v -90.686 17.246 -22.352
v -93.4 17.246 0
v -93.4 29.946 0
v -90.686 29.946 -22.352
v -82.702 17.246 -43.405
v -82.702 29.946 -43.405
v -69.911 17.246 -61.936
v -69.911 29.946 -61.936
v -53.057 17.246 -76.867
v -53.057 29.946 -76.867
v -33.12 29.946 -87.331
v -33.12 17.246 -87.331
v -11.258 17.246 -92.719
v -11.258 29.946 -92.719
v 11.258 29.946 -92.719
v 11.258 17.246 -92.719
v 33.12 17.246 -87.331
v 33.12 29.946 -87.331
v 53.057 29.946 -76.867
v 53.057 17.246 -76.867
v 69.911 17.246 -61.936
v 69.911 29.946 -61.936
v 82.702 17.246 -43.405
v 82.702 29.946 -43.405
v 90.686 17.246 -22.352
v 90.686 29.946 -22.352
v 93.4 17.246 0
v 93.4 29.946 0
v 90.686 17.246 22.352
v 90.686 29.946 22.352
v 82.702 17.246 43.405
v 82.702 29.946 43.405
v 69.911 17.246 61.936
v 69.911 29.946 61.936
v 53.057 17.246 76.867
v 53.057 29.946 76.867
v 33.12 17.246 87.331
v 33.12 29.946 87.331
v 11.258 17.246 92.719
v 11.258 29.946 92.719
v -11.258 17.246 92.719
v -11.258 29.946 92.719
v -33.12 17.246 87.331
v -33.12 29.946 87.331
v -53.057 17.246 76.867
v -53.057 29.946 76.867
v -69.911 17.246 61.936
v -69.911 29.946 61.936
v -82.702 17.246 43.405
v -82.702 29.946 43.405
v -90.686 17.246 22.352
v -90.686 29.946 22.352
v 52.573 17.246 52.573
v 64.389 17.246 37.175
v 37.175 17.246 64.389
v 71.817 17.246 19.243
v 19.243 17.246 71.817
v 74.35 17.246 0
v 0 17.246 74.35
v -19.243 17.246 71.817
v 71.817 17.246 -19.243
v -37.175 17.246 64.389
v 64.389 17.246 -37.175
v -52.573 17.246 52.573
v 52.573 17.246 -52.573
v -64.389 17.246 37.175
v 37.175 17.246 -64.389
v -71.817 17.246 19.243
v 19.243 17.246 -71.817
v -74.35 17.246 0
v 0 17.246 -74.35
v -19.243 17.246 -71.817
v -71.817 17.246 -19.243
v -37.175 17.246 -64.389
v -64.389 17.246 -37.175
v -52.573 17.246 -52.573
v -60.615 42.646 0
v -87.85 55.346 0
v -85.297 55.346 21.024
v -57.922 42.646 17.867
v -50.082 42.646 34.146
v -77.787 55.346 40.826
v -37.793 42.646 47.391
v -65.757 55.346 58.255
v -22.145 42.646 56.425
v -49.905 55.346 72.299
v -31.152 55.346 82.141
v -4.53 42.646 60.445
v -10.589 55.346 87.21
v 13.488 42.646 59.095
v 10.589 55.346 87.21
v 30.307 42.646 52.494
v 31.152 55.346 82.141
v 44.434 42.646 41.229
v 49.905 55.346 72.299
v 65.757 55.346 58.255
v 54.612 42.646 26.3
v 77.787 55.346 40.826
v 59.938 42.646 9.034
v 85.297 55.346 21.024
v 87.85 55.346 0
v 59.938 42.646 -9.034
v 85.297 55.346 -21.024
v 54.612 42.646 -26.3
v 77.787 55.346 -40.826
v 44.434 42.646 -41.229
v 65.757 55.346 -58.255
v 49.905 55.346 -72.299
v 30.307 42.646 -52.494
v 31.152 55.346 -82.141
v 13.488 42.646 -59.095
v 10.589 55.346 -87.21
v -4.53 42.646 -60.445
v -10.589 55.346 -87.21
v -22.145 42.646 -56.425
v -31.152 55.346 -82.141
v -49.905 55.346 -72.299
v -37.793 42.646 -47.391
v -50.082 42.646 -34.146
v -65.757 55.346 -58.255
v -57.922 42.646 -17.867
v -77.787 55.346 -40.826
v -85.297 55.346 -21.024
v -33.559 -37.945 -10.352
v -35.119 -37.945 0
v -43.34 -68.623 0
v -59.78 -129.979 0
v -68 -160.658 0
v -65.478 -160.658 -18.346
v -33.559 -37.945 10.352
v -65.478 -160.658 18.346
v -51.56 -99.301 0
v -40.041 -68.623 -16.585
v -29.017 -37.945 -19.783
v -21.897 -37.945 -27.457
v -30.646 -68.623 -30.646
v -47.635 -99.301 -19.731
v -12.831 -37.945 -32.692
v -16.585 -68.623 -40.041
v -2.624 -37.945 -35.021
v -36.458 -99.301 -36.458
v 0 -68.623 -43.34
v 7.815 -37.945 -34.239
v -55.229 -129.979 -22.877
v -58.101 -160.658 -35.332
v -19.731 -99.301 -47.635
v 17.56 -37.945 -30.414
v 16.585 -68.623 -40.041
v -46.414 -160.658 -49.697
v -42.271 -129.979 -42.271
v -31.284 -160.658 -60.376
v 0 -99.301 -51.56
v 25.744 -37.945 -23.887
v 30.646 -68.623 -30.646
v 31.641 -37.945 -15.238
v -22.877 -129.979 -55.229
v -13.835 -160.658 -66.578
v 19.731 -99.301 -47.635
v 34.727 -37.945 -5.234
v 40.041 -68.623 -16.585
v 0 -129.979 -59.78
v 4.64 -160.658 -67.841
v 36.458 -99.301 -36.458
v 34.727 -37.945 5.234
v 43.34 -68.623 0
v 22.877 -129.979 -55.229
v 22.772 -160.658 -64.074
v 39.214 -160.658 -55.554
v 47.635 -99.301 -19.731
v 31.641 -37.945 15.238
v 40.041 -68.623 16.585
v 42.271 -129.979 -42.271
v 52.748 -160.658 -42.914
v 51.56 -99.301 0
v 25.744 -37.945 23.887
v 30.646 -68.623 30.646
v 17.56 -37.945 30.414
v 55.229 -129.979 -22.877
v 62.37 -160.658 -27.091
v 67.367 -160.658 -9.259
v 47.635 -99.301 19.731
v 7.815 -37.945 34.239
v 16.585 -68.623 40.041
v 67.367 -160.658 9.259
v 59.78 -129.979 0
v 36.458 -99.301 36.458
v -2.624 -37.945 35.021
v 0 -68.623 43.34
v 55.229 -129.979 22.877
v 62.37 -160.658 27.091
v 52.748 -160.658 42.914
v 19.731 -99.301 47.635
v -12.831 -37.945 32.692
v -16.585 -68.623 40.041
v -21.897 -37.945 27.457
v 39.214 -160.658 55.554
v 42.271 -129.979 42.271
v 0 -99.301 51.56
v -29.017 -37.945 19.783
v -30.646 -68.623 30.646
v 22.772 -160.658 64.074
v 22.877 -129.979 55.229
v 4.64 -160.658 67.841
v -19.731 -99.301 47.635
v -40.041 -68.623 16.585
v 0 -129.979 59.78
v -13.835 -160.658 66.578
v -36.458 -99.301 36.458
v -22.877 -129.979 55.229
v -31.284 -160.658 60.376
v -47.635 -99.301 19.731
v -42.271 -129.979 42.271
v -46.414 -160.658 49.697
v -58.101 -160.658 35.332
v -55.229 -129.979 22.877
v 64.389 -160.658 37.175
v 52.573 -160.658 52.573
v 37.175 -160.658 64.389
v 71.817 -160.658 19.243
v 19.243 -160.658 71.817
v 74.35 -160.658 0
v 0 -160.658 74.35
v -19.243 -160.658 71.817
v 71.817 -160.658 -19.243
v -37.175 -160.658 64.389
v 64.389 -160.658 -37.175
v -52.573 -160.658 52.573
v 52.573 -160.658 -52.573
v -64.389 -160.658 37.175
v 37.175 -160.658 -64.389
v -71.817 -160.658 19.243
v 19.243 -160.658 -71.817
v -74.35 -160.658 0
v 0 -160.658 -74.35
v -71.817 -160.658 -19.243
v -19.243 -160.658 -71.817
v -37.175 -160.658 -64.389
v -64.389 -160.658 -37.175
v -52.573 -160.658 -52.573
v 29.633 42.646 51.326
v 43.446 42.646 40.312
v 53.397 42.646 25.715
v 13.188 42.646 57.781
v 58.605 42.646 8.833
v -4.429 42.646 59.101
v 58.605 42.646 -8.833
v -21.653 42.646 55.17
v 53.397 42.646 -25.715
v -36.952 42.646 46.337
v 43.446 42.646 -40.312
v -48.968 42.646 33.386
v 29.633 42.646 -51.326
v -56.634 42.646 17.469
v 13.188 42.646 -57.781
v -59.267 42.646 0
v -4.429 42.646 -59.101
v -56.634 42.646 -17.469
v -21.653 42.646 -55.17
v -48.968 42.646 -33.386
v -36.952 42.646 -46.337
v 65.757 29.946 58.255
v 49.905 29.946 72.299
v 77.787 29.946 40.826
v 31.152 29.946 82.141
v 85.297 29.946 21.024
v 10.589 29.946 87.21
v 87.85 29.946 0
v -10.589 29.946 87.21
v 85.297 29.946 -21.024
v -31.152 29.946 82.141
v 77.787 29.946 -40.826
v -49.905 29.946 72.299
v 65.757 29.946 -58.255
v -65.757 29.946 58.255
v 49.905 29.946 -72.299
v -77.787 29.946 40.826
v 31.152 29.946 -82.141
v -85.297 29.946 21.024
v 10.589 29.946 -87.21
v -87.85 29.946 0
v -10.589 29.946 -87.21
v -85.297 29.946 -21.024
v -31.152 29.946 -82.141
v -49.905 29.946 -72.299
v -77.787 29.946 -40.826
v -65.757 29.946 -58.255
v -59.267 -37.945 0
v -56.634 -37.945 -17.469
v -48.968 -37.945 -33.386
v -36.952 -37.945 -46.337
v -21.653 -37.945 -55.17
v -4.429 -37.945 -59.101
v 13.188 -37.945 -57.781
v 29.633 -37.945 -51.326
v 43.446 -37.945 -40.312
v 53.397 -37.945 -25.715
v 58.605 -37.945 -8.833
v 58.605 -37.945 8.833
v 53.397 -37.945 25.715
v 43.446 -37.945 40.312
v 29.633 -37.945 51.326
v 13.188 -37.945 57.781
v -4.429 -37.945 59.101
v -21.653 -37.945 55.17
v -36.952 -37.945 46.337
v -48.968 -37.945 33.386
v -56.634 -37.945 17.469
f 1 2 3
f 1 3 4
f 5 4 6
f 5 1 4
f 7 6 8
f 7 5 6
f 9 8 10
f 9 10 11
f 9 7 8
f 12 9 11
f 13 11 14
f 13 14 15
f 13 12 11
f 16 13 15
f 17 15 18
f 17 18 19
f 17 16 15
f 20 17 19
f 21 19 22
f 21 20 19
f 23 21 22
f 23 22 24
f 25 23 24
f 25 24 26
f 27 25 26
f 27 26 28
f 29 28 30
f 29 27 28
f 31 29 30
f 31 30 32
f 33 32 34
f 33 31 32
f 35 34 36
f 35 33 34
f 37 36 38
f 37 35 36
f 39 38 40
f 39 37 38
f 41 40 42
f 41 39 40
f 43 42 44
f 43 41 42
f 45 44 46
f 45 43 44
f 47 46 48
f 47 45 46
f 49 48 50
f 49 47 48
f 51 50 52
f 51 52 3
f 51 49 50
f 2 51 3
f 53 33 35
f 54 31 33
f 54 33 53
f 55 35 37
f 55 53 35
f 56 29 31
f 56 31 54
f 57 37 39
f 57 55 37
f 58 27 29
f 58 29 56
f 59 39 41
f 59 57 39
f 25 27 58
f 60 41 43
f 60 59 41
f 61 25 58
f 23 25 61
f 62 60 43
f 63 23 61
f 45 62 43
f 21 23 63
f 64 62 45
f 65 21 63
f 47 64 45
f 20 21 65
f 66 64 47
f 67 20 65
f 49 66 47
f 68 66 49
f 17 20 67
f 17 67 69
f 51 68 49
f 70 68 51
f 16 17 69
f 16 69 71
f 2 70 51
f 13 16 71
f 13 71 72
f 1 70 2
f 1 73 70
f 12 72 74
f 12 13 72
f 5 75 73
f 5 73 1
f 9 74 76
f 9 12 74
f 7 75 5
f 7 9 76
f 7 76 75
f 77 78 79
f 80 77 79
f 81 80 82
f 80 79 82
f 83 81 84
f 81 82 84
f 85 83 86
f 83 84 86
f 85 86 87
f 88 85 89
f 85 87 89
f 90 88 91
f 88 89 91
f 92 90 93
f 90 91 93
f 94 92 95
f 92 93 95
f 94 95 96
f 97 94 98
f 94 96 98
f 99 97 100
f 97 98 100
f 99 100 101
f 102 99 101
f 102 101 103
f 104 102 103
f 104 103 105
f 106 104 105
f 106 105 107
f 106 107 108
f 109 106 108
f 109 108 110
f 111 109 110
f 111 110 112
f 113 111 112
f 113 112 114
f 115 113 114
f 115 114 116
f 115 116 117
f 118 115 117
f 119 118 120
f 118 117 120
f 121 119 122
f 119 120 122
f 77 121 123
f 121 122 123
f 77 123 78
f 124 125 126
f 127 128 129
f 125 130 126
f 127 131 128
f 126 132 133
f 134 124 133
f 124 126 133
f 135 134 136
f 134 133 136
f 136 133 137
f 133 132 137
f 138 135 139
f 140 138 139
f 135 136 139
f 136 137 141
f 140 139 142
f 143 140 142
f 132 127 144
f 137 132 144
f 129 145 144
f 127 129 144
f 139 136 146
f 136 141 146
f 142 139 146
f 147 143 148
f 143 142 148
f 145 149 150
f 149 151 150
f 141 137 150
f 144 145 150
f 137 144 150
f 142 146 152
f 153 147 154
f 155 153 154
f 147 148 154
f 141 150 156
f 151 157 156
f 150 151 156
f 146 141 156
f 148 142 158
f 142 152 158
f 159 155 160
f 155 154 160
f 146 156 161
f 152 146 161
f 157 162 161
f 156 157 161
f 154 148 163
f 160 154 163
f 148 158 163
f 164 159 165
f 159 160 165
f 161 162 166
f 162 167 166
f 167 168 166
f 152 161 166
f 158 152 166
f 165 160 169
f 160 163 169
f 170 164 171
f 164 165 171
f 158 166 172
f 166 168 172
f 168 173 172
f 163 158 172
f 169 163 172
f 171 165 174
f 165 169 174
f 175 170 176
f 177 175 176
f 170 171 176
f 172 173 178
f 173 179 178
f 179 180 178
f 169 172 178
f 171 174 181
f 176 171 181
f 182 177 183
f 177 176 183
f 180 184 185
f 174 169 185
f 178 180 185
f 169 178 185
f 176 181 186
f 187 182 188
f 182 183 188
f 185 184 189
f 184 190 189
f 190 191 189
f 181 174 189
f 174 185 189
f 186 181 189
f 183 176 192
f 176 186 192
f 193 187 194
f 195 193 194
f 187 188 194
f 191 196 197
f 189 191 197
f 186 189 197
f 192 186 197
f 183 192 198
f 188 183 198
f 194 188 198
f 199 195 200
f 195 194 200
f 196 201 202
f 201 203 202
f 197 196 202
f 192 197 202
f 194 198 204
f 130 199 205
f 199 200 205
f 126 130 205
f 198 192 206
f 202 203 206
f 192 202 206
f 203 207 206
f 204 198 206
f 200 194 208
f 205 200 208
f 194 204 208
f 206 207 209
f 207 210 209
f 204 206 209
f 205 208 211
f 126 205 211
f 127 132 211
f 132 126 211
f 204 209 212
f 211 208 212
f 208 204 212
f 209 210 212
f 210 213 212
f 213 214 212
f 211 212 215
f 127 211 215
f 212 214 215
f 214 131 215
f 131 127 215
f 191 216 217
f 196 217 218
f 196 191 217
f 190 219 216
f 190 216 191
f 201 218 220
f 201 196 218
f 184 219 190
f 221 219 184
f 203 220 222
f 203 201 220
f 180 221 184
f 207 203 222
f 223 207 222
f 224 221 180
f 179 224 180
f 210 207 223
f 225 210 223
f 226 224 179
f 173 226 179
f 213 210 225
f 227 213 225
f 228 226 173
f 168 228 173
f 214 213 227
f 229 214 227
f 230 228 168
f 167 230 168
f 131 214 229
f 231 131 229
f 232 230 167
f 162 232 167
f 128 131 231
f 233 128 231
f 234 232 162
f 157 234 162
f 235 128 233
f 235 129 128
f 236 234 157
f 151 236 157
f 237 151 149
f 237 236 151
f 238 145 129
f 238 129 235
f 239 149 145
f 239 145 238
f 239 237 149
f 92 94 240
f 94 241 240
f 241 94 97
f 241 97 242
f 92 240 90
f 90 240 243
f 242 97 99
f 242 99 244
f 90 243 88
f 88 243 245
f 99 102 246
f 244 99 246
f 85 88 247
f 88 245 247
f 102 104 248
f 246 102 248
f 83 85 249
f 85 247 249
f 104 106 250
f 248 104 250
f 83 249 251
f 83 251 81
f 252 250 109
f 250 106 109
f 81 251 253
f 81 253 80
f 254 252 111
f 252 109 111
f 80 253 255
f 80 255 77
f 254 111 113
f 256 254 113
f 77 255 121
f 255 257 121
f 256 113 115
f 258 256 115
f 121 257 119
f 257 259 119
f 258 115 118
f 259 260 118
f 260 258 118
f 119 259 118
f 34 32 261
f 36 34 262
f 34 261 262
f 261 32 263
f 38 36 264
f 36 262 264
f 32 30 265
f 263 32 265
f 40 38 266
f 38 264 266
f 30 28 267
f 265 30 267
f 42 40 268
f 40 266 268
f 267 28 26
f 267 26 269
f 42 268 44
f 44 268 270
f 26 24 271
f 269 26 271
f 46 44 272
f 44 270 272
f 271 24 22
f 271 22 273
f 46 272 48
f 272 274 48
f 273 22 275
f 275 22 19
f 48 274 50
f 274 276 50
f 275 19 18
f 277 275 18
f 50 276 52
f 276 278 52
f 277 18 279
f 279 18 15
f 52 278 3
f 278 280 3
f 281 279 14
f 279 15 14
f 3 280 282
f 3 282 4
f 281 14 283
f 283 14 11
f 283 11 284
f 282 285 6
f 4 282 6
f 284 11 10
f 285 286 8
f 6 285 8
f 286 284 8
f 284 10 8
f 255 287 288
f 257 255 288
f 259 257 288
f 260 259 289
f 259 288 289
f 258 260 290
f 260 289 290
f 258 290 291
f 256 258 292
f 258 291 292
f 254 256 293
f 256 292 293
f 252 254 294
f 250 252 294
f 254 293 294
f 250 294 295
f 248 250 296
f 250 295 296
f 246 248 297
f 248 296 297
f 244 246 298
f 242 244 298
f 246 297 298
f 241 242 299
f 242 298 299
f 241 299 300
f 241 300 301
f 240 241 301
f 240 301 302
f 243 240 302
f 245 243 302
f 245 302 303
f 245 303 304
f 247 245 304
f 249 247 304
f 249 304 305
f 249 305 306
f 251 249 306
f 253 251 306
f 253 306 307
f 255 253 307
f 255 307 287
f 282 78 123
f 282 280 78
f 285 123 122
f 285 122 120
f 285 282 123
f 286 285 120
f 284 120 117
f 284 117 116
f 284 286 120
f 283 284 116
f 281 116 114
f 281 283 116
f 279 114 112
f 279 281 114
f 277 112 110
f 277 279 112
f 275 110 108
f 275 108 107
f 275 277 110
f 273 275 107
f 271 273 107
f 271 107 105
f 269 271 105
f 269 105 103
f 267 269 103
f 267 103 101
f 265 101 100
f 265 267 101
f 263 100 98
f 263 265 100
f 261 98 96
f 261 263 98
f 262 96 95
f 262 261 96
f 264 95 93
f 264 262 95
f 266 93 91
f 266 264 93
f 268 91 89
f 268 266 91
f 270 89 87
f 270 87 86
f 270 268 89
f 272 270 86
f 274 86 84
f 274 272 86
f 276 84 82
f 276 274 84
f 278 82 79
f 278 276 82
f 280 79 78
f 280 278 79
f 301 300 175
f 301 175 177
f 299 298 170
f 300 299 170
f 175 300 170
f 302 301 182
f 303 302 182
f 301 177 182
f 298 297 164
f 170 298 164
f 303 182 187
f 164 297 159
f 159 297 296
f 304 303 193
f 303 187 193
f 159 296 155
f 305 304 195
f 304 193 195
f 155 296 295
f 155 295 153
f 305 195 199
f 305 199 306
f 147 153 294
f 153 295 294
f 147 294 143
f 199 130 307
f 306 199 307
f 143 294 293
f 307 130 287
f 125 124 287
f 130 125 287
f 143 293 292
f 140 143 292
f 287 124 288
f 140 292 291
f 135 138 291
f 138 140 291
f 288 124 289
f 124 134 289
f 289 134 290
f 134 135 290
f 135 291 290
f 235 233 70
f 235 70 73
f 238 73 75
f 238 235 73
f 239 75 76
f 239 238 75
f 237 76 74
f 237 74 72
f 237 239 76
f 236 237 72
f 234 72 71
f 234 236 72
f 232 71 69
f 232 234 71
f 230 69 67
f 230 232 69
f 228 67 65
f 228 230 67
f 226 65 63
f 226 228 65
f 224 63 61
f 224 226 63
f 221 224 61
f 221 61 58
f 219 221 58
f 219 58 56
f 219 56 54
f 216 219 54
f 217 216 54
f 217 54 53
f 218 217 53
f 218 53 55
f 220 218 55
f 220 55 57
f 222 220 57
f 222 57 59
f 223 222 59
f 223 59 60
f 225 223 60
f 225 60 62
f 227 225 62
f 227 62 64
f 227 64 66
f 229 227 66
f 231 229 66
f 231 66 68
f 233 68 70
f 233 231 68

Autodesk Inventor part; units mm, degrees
ref_plane "YZ Plane" through (0, 0, 0) normal (1, 0, 0) x (0, 1, 0)
ref_plane "XZ Plane" through (0, 0, 0) normal (0, 1, 0) x (-1, 0, 0)
ref_plane "XY Plane" through (0, 0, 0) normal (0, 0, 1) x (1, 0, 0)
sketch "Sketch1" plane through (0, 0, 0) normal (0, 0, 1) x (1, 0, 0)
  line L0 (-87.8501, 55.3459) -> (-87.8501, 29.9459)
  line L1 (-87.8501, 29.9459) -> (-93.4, 29.9459)
  line L2 (-59.2667, 42.6459) -> (-60.6149, 42.6459)
  line L3 (-59.2667, 42.6459) -> (0, 42.6459) construction
  line L4 (-41.4694, -37.9453) -> (-35.1194, -37.9453)
  line L5 (-93.4, 29.9459) -> (-93.4, 17.2459)
  line L6 (-93.4, 17.2459) -> (-80.7, 17.2459)
  line L7 (-80.7, 17.2459) -> (-74.35, 17.2459)
  line L8 (-74.35, 17.2459) -> (-74.35, -160.6575)
  line L9 (-93.4, 17.2459) -> (-93.4, 7.7209)
  line L10 (-93.4, 17.2459) -> (-83.875, 17.2459) construction
  line L11 (-93.4, 7.7209) -> (-80.7, 7.7209)
  line L12 (-80.7, 7.7209) -> (-80.7, -43.0791)
  line L13 (-80.7, -43.0791) -> (-93.4, -43.0791)
  line L14 (-93.4, 7.7209) -> (-87.05, 7.7209)
  line L15 (-87.05, 7.7209) -> (-87.05, 1.7773)
  line L16 (-87.05, 1.7773) -> (-93.4, 1.7773)
  line L17 (-93.4, 29.9459) -> (-93.4, 7.7209)
  line L18 (-93.4, 1.7773) -> (-93.4, -43.0791)
  line L19 (-80.7, -43.0791) -> (-21.9625, -43.0791) construction
  line L20 (-68, -160.6575) -> (-74.35, -160.6575)
  line L21 (-64.6621, -148.2003) -> (-40.1276, -148.2003) construction
  line L22 (0, 42.6459) -> (0, 0)
  line L23 (-87.8501, 55.3459) -> (-18.3062, 55.3459) construction
  line L24 (-87.8501, 55.3459) -> (-14.7047, 55.3459) construction
  line L25 (-87.8501, 55.3459) -> (-55.5582, 40.2879)
  line L26 (-87.8501, 55.3459) -> (-52.22, 55.3459) construction
  line L27 (-59.2667, 42.6459) -> (-59.2667, -37.9453)
  line L28 (-59.2667, 42.6459) -> (21.3245, 42.6459) construction
  line L29 (-59.2667, -37.9453) -> (-41.4694, -37.9453)
  line L30 (-68, -160.6575) -> (-35.1194, -37.9453)
  dimension "d87" = 25.4
  dimension "d88" = 5.5499
  dimension "d89" = 87.8501
  dimension "d90" = 12.7
  dimension "d92" = 59.2667
  dimension "d93" = 6.35
  dimension "d95" = 12.7
  dimension "d96" = 12.7
  dimension "d97" = 6.35
  dimension "d98" = 9.525
  dimension "d99" = 50.8
  dimension "d100" = 12.7
  dimension "d101" = 6.35
  dimension "d102" = 5.9436
  dimension "d113" = 25
  dimension "d115" = 32.2919
  dimension "d117" = 80.5912
revolve "Revolution2" add sketch "Sketch1" angle 360 about axis through (0, 42.6459, 0) along (0, -1, 0) contours L25 L27 L29 L4 L30 L20 L8 L7 L6 L5 L1 L0 | L2 L27 L25
properties part number "Phenolic 8-inch v1" material "Phenolic Resin"
